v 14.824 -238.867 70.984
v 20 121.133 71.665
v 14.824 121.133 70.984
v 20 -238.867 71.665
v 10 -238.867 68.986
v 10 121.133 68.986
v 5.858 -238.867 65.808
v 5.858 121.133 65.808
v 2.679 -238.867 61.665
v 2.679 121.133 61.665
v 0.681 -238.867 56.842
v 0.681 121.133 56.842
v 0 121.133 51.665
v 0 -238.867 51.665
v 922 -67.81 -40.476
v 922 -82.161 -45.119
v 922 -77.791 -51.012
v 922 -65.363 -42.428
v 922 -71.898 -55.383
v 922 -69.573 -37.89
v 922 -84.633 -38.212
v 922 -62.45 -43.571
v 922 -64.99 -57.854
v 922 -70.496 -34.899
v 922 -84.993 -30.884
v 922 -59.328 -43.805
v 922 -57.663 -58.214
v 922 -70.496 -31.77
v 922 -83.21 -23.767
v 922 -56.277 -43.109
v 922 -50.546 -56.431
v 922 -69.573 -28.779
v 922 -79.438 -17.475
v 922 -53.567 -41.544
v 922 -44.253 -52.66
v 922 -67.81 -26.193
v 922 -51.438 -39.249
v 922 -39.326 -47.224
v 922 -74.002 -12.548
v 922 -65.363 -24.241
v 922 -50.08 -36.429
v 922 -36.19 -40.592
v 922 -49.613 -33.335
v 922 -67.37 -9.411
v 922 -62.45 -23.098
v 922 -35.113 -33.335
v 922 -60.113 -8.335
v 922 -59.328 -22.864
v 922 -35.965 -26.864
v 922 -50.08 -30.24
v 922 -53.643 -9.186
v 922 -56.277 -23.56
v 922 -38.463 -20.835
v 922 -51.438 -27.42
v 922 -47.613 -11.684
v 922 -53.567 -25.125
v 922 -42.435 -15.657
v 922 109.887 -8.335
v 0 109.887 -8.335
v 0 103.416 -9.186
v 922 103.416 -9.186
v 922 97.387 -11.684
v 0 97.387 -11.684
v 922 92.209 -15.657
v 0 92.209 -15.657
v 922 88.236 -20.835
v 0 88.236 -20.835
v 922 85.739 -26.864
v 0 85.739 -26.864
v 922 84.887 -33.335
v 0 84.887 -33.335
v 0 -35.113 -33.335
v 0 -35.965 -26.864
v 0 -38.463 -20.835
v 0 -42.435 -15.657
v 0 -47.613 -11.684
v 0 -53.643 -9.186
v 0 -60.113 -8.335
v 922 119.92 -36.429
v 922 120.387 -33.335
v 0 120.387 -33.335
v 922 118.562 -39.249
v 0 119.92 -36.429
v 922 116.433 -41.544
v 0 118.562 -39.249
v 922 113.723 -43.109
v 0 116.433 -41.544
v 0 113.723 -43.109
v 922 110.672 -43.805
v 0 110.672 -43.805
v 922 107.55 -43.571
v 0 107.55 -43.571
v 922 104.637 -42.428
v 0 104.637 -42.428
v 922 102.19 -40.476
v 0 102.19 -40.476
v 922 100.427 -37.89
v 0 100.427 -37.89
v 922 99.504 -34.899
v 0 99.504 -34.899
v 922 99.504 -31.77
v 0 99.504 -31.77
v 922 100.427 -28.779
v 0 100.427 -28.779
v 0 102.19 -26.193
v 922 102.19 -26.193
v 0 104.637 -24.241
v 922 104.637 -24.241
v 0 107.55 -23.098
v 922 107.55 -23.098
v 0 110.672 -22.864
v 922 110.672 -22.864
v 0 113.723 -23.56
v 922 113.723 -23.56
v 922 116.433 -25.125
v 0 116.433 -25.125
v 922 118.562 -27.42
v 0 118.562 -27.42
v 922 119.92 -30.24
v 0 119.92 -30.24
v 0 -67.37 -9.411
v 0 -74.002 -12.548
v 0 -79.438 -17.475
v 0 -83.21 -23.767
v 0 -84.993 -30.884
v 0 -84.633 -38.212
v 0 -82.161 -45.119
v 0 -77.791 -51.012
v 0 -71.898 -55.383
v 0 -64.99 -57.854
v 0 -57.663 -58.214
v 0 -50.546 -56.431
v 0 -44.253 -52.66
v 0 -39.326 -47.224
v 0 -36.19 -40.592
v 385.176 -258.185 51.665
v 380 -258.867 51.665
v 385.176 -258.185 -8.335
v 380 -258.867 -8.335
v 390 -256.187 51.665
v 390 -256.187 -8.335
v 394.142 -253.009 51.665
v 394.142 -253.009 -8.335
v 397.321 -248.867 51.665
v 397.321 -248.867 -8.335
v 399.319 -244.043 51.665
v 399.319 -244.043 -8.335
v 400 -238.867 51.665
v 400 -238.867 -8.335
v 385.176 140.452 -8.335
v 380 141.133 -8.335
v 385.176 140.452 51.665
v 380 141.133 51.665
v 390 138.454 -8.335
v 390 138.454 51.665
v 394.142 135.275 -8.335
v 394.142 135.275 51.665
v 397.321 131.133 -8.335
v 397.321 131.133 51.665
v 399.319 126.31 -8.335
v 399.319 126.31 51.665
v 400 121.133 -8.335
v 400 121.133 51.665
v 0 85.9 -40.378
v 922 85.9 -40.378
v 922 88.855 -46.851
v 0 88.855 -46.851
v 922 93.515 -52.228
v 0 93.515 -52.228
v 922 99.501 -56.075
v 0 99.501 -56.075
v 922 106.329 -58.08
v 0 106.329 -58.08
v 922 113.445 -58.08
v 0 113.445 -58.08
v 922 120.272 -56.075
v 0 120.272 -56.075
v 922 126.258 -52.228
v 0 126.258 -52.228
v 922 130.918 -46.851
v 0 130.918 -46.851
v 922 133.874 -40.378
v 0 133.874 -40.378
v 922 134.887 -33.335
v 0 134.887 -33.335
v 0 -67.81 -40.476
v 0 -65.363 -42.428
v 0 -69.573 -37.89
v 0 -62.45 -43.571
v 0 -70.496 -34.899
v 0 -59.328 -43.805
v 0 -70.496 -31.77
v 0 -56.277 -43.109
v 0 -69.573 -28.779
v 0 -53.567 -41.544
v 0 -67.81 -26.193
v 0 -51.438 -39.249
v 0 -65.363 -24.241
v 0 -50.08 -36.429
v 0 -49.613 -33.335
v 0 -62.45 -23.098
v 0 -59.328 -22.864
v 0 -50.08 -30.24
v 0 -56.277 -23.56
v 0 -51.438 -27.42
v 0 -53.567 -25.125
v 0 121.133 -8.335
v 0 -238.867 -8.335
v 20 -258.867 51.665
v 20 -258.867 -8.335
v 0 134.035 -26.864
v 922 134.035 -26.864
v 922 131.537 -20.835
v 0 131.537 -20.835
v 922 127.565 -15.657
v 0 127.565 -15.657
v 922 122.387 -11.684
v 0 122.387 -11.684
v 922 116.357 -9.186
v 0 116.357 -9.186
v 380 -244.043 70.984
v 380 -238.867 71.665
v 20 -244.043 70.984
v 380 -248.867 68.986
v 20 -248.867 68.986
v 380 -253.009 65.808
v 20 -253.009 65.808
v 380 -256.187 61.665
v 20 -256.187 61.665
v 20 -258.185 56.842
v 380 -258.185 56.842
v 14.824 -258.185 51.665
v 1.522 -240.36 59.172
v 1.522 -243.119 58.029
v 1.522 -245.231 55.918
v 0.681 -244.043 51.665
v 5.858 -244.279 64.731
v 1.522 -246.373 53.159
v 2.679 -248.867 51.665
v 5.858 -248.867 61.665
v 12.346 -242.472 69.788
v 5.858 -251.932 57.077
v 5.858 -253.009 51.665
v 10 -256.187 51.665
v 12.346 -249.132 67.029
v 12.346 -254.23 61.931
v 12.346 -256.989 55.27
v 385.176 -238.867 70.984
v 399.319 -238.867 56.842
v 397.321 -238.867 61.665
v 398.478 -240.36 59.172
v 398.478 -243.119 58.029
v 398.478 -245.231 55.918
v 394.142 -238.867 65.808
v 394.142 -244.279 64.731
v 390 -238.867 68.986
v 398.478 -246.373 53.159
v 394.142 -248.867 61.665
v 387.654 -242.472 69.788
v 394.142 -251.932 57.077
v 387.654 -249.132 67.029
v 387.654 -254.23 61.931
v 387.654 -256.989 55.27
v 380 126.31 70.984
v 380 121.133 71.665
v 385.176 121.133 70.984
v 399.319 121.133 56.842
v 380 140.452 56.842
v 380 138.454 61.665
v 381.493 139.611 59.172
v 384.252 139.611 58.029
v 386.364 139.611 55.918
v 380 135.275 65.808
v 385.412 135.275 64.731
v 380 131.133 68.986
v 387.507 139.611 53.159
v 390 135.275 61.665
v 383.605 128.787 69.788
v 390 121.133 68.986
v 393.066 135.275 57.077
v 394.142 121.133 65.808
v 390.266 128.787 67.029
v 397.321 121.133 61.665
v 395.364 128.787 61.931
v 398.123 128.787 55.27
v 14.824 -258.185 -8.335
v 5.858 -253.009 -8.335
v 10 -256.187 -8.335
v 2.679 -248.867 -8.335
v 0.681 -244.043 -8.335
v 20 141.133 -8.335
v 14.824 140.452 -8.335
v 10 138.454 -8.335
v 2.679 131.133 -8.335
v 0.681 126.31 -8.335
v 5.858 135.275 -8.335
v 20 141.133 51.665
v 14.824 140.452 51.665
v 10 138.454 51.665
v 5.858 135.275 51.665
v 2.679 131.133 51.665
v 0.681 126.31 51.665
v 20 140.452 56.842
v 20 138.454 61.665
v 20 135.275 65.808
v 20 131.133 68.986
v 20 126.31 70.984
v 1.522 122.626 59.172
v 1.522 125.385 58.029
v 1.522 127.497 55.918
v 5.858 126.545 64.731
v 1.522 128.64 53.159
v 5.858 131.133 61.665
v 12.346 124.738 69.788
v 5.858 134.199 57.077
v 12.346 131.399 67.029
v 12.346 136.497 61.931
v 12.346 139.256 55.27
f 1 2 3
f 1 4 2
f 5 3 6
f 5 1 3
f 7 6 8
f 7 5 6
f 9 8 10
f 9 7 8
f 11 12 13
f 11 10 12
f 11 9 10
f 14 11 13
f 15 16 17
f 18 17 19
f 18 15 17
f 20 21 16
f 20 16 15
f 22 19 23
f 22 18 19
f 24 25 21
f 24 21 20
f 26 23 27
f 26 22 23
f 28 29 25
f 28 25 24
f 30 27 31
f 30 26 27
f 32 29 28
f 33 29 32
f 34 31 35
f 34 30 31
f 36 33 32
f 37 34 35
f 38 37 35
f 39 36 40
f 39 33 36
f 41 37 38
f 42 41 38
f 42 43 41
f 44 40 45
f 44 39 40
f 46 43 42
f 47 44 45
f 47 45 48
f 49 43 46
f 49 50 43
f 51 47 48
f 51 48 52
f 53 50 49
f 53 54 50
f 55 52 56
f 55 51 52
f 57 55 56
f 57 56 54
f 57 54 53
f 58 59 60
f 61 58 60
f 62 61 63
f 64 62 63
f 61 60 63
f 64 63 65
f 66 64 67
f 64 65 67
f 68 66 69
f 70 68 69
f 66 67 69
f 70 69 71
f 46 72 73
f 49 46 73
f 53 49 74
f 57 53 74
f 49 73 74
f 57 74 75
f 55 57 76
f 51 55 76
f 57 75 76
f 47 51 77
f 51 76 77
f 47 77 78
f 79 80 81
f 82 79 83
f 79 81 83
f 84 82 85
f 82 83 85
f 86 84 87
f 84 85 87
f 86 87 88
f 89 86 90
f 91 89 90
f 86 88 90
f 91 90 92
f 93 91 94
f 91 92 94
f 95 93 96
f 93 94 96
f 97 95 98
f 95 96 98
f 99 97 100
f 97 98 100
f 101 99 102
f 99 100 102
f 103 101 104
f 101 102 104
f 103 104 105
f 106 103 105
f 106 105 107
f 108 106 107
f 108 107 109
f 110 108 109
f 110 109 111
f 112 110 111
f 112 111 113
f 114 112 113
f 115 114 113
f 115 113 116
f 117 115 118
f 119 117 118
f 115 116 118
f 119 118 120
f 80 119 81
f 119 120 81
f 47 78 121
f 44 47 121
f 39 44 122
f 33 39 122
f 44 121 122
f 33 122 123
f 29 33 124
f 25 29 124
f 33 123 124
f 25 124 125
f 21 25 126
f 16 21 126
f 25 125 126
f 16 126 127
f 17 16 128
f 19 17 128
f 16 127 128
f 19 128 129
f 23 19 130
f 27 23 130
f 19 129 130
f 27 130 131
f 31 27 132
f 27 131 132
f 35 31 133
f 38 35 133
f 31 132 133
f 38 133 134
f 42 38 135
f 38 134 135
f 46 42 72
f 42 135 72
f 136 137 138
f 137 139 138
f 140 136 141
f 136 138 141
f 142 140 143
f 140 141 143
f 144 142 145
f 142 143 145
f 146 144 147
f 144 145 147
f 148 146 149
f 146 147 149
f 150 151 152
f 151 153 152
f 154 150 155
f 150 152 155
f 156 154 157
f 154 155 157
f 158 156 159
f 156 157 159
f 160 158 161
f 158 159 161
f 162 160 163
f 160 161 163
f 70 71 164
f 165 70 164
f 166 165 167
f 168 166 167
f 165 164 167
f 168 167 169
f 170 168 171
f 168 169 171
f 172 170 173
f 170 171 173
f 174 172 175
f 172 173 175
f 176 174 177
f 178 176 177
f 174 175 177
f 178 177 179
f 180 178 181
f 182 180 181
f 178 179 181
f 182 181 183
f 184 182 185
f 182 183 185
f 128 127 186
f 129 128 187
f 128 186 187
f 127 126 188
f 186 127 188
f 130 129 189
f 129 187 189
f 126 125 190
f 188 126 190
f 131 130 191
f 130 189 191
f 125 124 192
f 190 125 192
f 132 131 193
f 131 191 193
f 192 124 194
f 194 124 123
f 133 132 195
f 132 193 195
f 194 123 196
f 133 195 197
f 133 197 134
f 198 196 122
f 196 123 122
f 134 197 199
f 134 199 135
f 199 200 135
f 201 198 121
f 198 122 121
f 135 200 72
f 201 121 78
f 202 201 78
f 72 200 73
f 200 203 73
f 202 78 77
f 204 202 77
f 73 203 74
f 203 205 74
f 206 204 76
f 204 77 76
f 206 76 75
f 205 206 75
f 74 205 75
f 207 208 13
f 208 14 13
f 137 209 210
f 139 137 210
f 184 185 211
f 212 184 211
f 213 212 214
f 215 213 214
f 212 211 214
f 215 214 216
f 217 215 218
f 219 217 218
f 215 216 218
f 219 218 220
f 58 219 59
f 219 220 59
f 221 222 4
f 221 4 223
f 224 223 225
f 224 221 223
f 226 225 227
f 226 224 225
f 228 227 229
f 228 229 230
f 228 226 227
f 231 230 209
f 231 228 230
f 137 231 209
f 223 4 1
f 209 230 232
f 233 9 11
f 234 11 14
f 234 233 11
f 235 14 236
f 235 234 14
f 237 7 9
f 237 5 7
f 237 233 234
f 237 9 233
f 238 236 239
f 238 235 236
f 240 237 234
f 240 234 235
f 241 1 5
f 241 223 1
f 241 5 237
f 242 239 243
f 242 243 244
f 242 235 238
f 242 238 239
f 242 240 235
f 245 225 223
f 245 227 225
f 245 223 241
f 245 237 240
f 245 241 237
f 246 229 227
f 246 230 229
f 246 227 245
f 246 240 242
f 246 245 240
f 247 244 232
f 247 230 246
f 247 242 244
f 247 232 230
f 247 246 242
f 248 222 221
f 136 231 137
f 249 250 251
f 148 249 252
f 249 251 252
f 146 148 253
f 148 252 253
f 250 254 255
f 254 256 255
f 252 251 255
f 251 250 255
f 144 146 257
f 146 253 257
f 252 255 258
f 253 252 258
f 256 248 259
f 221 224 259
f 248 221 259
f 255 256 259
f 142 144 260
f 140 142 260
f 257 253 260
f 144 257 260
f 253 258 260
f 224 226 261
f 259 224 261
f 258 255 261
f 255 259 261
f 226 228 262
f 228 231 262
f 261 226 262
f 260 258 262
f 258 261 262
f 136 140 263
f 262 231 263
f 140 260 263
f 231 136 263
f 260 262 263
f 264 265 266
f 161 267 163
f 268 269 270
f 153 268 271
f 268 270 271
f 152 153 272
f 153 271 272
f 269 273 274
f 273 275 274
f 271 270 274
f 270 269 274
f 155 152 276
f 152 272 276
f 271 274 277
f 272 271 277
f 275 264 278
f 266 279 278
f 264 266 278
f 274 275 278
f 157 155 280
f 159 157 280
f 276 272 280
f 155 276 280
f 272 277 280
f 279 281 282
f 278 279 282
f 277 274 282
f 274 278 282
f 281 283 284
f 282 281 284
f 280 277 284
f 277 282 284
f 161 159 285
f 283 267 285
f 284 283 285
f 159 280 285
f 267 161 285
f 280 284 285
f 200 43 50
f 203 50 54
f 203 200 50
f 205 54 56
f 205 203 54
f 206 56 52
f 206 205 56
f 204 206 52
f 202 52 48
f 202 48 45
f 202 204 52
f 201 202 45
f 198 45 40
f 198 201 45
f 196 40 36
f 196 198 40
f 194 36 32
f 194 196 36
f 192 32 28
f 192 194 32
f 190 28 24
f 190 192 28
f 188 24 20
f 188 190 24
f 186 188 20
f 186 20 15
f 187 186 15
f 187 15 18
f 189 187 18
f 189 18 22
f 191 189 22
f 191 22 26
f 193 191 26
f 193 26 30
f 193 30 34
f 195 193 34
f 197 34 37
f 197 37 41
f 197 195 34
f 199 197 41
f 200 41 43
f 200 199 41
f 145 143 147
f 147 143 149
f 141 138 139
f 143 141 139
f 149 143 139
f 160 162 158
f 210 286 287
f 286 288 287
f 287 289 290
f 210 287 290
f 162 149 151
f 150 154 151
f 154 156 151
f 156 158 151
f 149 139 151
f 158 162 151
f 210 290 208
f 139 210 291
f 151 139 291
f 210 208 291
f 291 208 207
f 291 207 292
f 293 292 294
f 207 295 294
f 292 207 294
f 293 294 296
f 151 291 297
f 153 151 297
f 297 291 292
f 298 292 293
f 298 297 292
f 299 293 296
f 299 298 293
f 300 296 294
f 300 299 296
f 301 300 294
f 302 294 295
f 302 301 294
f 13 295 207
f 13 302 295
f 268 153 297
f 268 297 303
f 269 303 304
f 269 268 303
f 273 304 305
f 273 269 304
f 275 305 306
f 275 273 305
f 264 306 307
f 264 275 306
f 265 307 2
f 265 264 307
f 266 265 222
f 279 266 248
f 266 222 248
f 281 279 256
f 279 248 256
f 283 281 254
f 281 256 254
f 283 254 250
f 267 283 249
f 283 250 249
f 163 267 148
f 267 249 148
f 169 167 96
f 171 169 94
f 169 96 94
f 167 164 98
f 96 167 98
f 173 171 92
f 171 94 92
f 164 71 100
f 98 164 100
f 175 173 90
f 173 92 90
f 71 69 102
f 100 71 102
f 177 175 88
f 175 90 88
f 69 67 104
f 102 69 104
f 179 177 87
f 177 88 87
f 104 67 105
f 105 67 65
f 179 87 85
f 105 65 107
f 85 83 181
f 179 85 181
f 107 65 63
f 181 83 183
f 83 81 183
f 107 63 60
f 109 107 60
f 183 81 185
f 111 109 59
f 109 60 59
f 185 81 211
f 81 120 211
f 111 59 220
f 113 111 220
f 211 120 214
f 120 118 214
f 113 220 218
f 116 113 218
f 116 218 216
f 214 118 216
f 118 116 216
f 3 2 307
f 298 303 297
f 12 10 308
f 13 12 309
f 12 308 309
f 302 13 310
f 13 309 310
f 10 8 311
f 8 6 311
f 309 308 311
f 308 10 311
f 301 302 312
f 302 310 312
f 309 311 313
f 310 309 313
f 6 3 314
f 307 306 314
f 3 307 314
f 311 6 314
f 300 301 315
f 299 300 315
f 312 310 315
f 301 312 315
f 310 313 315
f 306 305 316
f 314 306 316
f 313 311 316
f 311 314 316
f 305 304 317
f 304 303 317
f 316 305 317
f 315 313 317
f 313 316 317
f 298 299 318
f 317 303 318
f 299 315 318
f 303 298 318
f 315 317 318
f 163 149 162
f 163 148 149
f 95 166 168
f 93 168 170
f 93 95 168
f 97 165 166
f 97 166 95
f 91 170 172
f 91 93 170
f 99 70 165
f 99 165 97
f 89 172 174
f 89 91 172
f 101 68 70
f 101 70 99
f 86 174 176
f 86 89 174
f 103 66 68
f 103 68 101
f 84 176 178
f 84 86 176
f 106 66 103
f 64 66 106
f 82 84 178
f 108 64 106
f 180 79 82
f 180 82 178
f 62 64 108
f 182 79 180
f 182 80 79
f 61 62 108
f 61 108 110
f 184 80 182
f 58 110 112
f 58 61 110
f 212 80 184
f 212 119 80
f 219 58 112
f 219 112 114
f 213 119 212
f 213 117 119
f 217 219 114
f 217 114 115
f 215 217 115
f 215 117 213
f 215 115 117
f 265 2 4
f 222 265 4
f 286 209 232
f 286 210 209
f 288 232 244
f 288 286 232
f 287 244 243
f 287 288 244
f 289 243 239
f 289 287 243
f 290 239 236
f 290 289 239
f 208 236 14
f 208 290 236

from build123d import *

# Parameters (mm, degrees)
F1_DEPTH = 400
F0_R     = 10.5
F2_DEPTH = 922
F3_R     = 20


# Not quite as in the source:
# - a feature names something its author has since deleted; it is built from what else it names


with BuildPart() as f1:
    # F0 (on Right) → F1 (new body)
    with BuildSketch(Plane.YZ):
        Polygon((-258.8667411456, -8.3345091114), (-60.1131648569, -8.3345091114), (109.8868350748, -8.3345091114), (141.1332431091, -8.3345091114), (141.1332431091, 71.6654908886), (-258.8667411456, 71.6654908886), align=None)
    extrude(amount=F1_DEPTH)

    # F3
    f3_edges = [f1.edges().sort_by_distance(p)[0] for p in [
        (200, -258.866741, 71.665491),
        (400, -58.866749, 71.665491),
        (200, 141.133243, 71.665491),
        (0, -58.866749, 71.665491),
        (400, 141.133243, 31.665491),
        (0, 141.133243, 31.665491),
        (400, -258.866741, 31.665491),
        (0, -258.866741, 31.665491),
    ]]
    fillet(f3_edges, radius=F3_R)


with BuildPart() as f2:
    # F0 (on Right) → F2 (new body)
    with BuildSketch(Plane.YZ):
        with BuildLine():
            ThreePointArc((-60.1131648569, -8.3345091114), (-77.790834479, -51.0121786169), (-35.1131649252, -33.3345091114))
            ThreePointArc((-35.1131649252, -33.3345091114), (-42.4354953714, -15.6568396059), (-60.1131648569, -8.3345091114))
        make_face()
        with Locations((-60.1131649252, -33.3345091114)):
            Circle(F0_R, mode=Mode.SUBTRACT)
    extrude(amount=F2_DEPTH)


with BuildPart() as f2b:
    # F0 (on Right) → F2, piece 2 (new body)
    with BuildSketch(Plane.YZ):
        with BuildLine():
            ThreePointArc((109.8868350748, -8.3345091114), (92.2091655451, -15.6568395818), (84.8868350748, -33.3345091114))
            Line((84.8868350748, -33.3345091114), (99.3868350748, -33.3345091114))
            ThreePointArc((99.3868350748, -33.3345091114), (109.8868350748, -22.8345091114), (120.3868350748, -33.3345091114))
            Line((120.3868350748, -33.3345091114), (134.8868350748, -33.3345091114))
            ThreePointArc((134.8868350748, -33.3345091114), (127.5645046045, -15.6568395818), (109.8868350748, -8.3345091114))
        make_face()
        with BuildLine():
            Line((99.3868350748, -33.3345091114), (84.8868350748, -33.3345091114))
            ThreePointArc((84.8868350748, -33.3345091114), (109.8868350748, -58.3345091114), (134.8868350748, -33.3345091114))
            Line((134.8868350748, -33.3345091114), (120.3868350748, -33.3345091114))
            ThreePointArc((120.3868350748, -33.3345091114), (109.8868350748, -43.8345091114), (99.3868350748, -33.3345091114))
        make_face()
    extrude(amount=F2_DEPTH)


solid = Compound([f1.part, f2.part, f2b.part])
